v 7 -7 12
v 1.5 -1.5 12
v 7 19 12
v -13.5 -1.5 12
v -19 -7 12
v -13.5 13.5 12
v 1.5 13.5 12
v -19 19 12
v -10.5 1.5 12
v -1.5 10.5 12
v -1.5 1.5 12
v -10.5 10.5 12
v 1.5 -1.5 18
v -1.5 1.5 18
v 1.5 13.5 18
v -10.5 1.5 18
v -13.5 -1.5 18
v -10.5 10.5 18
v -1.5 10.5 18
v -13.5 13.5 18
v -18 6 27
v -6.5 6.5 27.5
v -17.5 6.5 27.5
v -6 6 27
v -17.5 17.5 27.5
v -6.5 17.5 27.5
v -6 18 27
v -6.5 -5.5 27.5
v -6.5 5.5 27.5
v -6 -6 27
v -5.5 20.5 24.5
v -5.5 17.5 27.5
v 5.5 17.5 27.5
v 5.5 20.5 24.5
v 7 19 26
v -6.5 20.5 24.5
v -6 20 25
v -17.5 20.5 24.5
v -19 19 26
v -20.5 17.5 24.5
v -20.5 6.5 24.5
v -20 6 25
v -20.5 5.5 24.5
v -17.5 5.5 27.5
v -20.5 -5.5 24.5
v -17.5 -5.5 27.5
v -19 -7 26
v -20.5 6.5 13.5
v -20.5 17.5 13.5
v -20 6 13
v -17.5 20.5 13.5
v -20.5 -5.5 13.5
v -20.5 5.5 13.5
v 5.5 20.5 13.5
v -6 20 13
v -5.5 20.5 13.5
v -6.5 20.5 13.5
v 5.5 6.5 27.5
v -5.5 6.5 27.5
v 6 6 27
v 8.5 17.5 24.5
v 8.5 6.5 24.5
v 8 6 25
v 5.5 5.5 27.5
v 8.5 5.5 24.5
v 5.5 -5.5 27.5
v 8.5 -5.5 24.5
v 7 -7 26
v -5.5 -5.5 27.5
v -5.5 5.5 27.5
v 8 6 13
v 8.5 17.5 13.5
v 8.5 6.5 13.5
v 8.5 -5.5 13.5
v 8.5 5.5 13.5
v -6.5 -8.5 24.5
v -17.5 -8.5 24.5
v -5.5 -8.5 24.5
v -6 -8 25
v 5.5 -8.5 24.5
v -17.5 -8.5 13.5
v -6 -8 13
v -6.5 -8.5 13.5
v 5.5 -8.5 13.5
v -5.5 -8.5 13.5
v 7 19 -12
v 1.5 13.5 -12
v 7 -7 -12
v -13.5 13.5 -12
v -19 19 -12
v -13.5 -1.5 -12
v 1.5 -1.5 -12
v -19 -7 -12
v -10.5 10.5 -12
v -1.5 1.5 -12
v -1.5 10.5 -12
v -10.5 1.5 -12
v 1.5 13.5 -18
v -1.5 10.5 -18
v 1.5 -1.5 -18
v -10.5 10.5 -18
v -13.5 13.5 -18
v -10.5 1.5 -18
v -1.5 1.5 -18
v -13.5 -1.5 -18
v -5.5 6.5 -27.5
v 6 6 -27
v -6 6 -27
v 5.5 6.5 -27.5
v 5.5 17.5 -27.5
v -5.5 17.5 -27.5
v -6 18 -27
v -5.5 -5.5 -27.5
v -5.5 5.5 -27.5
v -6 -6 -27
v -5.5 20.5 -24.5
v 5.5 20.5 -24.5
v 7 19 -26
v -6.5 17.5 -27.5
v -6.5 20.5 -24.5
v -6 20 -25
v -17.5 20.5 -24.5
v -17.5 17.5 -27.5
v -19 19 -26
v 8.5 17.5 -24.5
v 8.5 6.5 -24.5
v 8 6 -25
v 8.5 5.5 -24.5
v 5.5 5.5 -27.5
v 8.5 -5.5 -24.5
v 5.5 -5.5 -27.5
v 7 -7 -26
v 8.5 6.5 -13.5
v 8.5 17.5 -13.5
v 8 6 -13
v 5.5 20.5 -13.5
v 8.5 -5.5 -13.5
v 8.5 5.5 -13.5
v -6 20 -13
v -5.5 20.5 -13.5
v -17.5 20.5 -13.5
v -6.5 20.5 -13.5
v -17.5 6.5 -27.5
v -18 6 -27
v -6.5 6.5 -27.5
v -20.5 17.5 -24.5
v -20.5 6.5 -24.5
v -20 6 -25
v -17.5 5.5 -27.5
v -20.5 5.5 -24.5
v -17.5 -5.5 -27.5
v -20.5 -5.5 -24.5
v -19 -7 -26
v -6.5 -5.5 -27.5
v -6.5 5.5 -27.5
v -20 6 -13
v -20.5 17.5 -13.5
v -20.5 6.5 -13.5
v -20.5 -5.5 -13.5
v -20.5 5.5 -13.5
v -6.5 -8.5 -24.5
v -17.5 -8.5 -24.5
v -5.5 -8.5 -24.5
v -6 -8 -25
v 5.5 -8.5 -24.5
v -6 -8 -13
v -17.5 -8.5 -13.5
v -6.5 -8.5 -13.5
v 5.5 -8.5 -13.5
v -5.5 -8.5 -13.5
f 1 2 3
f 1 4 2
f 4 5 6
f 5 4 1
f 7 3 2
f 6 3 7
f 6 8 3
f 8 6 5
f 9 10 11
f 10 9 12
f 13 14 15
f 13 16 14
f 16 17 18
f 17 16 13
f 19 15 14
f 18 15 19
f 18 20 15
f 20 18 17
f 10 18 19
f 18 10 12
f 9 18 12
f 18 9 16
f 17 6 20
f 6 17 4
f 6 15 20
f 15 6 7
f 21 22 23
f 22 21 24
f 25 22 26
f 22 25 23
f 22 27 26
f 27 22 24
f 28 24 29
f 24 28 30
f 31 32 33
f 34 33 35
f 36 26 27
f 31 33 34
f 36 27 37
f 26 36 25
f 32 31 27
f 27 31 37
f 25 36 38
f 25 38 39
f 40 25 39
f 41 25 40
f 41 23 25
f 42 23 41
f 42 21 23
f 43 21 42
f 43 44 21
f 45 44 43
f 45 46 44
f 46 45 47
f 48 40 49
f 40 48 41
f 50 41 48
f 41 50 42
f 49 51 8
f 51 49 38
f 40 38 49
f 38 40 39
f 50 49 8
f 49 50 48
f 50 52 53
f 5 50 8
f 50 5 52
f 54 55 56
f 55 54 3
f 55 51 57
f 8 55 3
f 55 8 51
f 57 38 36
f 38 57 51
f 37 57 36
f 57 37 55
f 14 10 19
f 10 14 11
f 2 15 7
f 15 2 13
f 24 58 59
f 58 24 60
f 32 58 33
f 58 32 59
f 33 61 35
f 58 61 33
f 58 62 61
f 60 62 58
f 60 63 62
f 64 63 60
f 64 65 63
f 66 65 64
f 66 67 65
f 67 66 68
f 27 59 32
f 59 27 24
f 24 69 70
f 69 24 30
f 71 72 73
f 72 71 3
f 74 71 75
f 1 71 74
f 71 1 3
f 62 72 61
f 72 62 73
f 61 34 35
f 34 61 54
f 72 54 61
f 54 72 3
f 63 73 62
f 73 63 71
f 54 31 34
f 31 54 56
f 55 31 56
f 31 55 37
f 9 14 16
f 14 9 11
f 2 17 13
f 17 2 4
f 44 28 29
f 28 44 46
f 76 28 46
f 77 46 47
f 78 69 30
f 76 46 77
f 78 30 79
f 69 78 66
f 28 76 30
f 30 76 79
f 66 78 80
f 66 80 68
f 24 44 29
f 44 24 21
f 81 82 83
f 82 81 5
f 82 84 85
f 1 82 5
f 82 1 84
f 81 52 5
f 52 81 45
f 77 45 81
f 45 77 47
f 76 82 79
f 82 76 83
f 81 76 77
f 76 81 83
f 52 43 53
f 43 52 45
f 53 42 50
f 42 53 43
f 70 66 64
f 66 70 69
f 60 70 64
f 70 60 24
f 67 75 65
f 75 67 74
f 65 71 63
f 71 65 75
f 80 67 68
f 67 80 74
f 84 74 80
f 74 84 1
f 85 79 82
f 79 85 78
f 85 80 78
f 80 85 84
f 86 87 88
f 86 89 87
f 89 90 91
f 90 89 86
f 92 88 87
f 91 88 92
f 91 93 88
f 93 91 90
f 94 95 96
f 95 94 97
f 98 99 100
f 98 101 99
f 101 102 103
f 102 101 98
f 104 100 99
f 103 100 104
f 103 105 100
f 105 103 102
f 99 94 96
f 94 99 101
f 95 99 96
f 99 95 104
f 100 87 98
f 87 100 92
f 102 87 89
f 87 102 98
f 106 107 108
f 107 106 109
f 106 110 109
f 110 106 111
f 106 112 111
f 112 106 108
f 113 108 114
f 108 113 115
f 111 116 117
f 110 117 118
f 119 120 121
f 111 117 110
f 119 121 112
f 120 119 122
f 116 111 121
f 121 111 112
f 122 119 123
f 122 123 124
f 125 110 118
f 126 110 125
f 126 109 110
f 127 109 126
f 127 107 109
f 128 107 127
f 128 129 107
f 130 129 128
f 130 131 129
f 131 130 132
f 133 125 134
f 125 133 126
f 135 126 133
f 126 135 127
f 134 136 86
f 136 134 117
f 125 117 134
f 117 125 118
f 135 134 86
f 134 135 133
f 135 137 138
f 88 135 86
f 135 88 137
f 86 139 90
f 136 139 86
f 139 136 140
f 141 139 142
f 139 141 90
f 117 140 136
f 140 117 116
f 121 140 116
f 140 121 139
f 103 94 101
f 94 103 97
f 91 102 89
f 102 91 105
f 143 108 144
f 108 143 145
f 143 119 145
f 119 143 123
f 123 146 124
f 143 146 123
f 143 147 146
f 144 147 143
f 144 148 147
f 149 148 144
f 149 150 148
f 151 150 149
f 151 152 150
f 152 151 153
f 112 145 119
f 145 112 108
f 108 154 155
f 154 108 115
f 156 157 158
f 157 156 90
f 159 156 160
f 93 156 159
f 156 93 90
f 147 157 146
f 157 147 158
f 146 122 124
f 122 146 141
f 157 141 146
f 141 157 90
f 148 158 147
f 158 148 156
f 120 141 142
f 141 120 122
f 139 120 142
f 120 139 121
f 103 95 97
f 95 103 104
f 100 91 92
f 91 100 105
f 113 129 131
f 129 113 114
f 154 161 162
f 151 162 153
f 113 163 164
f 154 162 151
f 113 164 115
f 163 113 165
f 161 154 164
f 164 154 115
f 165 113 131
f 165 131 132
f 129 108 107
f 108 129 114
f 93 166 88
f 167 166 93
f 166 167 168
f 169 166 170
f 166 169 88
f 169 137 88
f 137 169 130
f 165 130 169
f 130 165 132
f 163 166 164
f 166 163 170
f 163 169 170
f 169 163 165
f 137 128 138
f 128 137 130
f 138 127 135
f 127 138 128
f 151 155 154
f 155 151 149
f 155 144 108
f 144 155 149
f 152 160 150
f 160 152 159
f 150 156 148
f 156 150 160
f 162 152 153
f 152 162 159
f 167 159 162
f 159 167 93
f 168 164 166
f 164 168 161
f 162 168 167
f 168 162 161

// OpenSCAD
// Generated at 2025-08-09T04:20:24.891Z
// by gen-model.ts

scene = "preview";

if (scene == "front") {
  frontPart();
} else if (scene == "back") {
  backPart();
} else if (scene == "ring") {
  ringPart();
} else if (scene == "all") {
  translate([-12, 0, 0]) frontPart();
  translate([12, 0, 0]) backPart();
  ringPart();
} else if (scene == "preview") {
  frontPart();
  translate([-12, 0, 0])
  rotate([0, 180, 0]) backPart();
}
  
module frontPart() {
  
// Main model
translate([0,0, 31])rotate([180,0,0]) union() {
    v(-1, -1, 1) voxel(walls=[1,0,0,1,1,0], grooves=[0,1,1,0]);
    v(0, -1, 1) voxel(walls=[1,1,0,0,1,0], grooves=[1,1,0,0]);
    v(-1, 0, 1) voxel(walls=[1,0,1,1,0,0], grooves=[0,0,1,1]);
    v(0, 0, 1) voxel(walls=[1,1,1,0,0,0], grooves=[1,0,0,1]);
}

}
  
module backPart() {
  
// Main model
translate([0,0, 31])rotate([180,0,0]) union() {
    v(-1, -1, 1) voxel(walls=[1,0,0,1,1,0], grooves=[0,1,1,0]);
    v(0, -1, 1) voxel(walls=[1,1,0,0,1,0], grooves=[1,1,0,0]);
    v(-1, 0, 1) voxel(walls=[1,0,1,1,0,0], grooves=[0,0,1,1]);
    v(0, 0, 1) voxel(walls=[1,1,1,0,0,0], grooves=[1,0,0,1]);
}

}
  
module ringPart() {
  
// Rings for connecting front and back parts
translate([0,0, -25])
union() {
    v(-1, -1, 1) ringCell(grooves=[0,1,1,0]);
    v(0, -1, 1) ringCell(grooves=[1,1,0,0]);
    v(-1, 0, 1) ringCell(grooves=[0,0,1,1]);
    v(0, 0, 1) ringCell(grooves=[1,0,0,1]);
}

}
  
// Voxel utility modules
voxelSize = 12;
wallThickness = 2;
ringWidth = 3;
ringHeight = 10;
ringTolerance = 0.025;

module v(x, y, z) {
    translate([x, y, z] * voxelSize) children();
}

module groovePart() {
    translate([-ringWidth/2, -ringWidth/2])
    square([voxelSize/2 + ringWidth/2 + 1, ringWidth]);
}

module ringLine() {
    // Generate positive ring piece that fits into groove
    translate([-ringWidth/2, -ringWidth/2])
    square([voxelSize/2 + ringWidth/2 + 1, ringWidth]);
}

module voxel(walls, grooves=[0,0,0,0]) {
    v2 = voxelSize/2;

    // Groves
    render() if (grooves[0] || grooves[1] || grooves[2] || grooves[3]) {
        height = voxelSize;
        
        difference() {
            translate([0, 0, voxelSize/2 - height + wallThickness/2])
               linear_extrude(height)
                square([voxelSize, voxelSize], center=true);
        
            
            translate([0,0,1]) 
                linear_extrude(ringHeight/2+1) {
                    if (grooves[0]) rotate(180) groovePart();
                    if (grooves[1]) rotate(90) groovePart();
                    if (grooves[2]) rotate(0) groovePart();
                    if (grooves[3]) rotate(270) groovePart();
                }
        }
    }
    
    // 0: floor (-z)
    if (walls[0]) color([0,0,1]) translate([0, 0, -v2]) rotate([0, 180, 0]) voxelWall();
    
    // 1: right (+x)
    if (walls[1]) color([0,1,0]) translate([v2, 0, 0]) rotate([90, 0, 90]) voxelWall();
    
    // 2: up (+y)
    if (walls[2]) color([0,1,1]) translate([0, v2, 0]) rotate([-90, 0, 0]) voxelWall();
    
    // 3: left (-x)
    if (walls[3]) color([1,0,0]) translate([-v2, 0, 0]) rotate([90, 0, -90]) voxelWall();
    
    // 4: down (-y)
    if (walls[4]) color([1,0,1]) translate([0, -v2, 0]) rotate([90, 0, 0]) voxelWall();
    
    // 5: ceiling (+z)
    if (walls[5]) color([1,1,1]) translate([0, 0, v2]) voxelWall();
}

module voxelWall() {
    render() hull() {        
        cube([
            voxelSize+wallThickness,
            voxelSize+wallThickness,
            wallThickness
        ], center=true);
        
        translate([0,0,wallThickness])
            linear_extrude(wallThickness/4)
            square([
                voxelSize-1, 
                voxelSize-1,
            ], center=true);
    }
}

module solidVoxel(ring=false) {
    difference() {
        cube([voxelSize, voxelSize, voxelSize], center=true);
        
        if (ring) {
            // Cut ring groove around the perimeter
            ringGroove();
        }
    }
}

module ringGroove() {
    // Horizontal groove around the middle of the voxel
    translate([0, 0, 0])
        rotate_extrude()
        translate([voxelSize/2 - ringWidth/2, 0])
        square([ringWidth + ringTolerance, ringHeight + ringTolerance], center=true);
}

module ringCell(grooves=[0,0,0,0]) {
    // Generate positive ring pieces that fit into grooves
    if (grooves[0] || grooves[1] || grooves[2] || grooves[3]) {
        height = ringHeight;
        translate([0, 0, voxelSize/2 - height/2])
            linear_extrude(height) offset(-ringTolerance) union() {
                // right (+x)
                if (grooves[0]) rotate(180) ringLine();
                if (grooves[1]) rotate(90) ringLine();
                if (grooves[2]) rotate(0) ringLine();
                if (grooves[3]) rotate(270) ringLine();
            }
    }
}
